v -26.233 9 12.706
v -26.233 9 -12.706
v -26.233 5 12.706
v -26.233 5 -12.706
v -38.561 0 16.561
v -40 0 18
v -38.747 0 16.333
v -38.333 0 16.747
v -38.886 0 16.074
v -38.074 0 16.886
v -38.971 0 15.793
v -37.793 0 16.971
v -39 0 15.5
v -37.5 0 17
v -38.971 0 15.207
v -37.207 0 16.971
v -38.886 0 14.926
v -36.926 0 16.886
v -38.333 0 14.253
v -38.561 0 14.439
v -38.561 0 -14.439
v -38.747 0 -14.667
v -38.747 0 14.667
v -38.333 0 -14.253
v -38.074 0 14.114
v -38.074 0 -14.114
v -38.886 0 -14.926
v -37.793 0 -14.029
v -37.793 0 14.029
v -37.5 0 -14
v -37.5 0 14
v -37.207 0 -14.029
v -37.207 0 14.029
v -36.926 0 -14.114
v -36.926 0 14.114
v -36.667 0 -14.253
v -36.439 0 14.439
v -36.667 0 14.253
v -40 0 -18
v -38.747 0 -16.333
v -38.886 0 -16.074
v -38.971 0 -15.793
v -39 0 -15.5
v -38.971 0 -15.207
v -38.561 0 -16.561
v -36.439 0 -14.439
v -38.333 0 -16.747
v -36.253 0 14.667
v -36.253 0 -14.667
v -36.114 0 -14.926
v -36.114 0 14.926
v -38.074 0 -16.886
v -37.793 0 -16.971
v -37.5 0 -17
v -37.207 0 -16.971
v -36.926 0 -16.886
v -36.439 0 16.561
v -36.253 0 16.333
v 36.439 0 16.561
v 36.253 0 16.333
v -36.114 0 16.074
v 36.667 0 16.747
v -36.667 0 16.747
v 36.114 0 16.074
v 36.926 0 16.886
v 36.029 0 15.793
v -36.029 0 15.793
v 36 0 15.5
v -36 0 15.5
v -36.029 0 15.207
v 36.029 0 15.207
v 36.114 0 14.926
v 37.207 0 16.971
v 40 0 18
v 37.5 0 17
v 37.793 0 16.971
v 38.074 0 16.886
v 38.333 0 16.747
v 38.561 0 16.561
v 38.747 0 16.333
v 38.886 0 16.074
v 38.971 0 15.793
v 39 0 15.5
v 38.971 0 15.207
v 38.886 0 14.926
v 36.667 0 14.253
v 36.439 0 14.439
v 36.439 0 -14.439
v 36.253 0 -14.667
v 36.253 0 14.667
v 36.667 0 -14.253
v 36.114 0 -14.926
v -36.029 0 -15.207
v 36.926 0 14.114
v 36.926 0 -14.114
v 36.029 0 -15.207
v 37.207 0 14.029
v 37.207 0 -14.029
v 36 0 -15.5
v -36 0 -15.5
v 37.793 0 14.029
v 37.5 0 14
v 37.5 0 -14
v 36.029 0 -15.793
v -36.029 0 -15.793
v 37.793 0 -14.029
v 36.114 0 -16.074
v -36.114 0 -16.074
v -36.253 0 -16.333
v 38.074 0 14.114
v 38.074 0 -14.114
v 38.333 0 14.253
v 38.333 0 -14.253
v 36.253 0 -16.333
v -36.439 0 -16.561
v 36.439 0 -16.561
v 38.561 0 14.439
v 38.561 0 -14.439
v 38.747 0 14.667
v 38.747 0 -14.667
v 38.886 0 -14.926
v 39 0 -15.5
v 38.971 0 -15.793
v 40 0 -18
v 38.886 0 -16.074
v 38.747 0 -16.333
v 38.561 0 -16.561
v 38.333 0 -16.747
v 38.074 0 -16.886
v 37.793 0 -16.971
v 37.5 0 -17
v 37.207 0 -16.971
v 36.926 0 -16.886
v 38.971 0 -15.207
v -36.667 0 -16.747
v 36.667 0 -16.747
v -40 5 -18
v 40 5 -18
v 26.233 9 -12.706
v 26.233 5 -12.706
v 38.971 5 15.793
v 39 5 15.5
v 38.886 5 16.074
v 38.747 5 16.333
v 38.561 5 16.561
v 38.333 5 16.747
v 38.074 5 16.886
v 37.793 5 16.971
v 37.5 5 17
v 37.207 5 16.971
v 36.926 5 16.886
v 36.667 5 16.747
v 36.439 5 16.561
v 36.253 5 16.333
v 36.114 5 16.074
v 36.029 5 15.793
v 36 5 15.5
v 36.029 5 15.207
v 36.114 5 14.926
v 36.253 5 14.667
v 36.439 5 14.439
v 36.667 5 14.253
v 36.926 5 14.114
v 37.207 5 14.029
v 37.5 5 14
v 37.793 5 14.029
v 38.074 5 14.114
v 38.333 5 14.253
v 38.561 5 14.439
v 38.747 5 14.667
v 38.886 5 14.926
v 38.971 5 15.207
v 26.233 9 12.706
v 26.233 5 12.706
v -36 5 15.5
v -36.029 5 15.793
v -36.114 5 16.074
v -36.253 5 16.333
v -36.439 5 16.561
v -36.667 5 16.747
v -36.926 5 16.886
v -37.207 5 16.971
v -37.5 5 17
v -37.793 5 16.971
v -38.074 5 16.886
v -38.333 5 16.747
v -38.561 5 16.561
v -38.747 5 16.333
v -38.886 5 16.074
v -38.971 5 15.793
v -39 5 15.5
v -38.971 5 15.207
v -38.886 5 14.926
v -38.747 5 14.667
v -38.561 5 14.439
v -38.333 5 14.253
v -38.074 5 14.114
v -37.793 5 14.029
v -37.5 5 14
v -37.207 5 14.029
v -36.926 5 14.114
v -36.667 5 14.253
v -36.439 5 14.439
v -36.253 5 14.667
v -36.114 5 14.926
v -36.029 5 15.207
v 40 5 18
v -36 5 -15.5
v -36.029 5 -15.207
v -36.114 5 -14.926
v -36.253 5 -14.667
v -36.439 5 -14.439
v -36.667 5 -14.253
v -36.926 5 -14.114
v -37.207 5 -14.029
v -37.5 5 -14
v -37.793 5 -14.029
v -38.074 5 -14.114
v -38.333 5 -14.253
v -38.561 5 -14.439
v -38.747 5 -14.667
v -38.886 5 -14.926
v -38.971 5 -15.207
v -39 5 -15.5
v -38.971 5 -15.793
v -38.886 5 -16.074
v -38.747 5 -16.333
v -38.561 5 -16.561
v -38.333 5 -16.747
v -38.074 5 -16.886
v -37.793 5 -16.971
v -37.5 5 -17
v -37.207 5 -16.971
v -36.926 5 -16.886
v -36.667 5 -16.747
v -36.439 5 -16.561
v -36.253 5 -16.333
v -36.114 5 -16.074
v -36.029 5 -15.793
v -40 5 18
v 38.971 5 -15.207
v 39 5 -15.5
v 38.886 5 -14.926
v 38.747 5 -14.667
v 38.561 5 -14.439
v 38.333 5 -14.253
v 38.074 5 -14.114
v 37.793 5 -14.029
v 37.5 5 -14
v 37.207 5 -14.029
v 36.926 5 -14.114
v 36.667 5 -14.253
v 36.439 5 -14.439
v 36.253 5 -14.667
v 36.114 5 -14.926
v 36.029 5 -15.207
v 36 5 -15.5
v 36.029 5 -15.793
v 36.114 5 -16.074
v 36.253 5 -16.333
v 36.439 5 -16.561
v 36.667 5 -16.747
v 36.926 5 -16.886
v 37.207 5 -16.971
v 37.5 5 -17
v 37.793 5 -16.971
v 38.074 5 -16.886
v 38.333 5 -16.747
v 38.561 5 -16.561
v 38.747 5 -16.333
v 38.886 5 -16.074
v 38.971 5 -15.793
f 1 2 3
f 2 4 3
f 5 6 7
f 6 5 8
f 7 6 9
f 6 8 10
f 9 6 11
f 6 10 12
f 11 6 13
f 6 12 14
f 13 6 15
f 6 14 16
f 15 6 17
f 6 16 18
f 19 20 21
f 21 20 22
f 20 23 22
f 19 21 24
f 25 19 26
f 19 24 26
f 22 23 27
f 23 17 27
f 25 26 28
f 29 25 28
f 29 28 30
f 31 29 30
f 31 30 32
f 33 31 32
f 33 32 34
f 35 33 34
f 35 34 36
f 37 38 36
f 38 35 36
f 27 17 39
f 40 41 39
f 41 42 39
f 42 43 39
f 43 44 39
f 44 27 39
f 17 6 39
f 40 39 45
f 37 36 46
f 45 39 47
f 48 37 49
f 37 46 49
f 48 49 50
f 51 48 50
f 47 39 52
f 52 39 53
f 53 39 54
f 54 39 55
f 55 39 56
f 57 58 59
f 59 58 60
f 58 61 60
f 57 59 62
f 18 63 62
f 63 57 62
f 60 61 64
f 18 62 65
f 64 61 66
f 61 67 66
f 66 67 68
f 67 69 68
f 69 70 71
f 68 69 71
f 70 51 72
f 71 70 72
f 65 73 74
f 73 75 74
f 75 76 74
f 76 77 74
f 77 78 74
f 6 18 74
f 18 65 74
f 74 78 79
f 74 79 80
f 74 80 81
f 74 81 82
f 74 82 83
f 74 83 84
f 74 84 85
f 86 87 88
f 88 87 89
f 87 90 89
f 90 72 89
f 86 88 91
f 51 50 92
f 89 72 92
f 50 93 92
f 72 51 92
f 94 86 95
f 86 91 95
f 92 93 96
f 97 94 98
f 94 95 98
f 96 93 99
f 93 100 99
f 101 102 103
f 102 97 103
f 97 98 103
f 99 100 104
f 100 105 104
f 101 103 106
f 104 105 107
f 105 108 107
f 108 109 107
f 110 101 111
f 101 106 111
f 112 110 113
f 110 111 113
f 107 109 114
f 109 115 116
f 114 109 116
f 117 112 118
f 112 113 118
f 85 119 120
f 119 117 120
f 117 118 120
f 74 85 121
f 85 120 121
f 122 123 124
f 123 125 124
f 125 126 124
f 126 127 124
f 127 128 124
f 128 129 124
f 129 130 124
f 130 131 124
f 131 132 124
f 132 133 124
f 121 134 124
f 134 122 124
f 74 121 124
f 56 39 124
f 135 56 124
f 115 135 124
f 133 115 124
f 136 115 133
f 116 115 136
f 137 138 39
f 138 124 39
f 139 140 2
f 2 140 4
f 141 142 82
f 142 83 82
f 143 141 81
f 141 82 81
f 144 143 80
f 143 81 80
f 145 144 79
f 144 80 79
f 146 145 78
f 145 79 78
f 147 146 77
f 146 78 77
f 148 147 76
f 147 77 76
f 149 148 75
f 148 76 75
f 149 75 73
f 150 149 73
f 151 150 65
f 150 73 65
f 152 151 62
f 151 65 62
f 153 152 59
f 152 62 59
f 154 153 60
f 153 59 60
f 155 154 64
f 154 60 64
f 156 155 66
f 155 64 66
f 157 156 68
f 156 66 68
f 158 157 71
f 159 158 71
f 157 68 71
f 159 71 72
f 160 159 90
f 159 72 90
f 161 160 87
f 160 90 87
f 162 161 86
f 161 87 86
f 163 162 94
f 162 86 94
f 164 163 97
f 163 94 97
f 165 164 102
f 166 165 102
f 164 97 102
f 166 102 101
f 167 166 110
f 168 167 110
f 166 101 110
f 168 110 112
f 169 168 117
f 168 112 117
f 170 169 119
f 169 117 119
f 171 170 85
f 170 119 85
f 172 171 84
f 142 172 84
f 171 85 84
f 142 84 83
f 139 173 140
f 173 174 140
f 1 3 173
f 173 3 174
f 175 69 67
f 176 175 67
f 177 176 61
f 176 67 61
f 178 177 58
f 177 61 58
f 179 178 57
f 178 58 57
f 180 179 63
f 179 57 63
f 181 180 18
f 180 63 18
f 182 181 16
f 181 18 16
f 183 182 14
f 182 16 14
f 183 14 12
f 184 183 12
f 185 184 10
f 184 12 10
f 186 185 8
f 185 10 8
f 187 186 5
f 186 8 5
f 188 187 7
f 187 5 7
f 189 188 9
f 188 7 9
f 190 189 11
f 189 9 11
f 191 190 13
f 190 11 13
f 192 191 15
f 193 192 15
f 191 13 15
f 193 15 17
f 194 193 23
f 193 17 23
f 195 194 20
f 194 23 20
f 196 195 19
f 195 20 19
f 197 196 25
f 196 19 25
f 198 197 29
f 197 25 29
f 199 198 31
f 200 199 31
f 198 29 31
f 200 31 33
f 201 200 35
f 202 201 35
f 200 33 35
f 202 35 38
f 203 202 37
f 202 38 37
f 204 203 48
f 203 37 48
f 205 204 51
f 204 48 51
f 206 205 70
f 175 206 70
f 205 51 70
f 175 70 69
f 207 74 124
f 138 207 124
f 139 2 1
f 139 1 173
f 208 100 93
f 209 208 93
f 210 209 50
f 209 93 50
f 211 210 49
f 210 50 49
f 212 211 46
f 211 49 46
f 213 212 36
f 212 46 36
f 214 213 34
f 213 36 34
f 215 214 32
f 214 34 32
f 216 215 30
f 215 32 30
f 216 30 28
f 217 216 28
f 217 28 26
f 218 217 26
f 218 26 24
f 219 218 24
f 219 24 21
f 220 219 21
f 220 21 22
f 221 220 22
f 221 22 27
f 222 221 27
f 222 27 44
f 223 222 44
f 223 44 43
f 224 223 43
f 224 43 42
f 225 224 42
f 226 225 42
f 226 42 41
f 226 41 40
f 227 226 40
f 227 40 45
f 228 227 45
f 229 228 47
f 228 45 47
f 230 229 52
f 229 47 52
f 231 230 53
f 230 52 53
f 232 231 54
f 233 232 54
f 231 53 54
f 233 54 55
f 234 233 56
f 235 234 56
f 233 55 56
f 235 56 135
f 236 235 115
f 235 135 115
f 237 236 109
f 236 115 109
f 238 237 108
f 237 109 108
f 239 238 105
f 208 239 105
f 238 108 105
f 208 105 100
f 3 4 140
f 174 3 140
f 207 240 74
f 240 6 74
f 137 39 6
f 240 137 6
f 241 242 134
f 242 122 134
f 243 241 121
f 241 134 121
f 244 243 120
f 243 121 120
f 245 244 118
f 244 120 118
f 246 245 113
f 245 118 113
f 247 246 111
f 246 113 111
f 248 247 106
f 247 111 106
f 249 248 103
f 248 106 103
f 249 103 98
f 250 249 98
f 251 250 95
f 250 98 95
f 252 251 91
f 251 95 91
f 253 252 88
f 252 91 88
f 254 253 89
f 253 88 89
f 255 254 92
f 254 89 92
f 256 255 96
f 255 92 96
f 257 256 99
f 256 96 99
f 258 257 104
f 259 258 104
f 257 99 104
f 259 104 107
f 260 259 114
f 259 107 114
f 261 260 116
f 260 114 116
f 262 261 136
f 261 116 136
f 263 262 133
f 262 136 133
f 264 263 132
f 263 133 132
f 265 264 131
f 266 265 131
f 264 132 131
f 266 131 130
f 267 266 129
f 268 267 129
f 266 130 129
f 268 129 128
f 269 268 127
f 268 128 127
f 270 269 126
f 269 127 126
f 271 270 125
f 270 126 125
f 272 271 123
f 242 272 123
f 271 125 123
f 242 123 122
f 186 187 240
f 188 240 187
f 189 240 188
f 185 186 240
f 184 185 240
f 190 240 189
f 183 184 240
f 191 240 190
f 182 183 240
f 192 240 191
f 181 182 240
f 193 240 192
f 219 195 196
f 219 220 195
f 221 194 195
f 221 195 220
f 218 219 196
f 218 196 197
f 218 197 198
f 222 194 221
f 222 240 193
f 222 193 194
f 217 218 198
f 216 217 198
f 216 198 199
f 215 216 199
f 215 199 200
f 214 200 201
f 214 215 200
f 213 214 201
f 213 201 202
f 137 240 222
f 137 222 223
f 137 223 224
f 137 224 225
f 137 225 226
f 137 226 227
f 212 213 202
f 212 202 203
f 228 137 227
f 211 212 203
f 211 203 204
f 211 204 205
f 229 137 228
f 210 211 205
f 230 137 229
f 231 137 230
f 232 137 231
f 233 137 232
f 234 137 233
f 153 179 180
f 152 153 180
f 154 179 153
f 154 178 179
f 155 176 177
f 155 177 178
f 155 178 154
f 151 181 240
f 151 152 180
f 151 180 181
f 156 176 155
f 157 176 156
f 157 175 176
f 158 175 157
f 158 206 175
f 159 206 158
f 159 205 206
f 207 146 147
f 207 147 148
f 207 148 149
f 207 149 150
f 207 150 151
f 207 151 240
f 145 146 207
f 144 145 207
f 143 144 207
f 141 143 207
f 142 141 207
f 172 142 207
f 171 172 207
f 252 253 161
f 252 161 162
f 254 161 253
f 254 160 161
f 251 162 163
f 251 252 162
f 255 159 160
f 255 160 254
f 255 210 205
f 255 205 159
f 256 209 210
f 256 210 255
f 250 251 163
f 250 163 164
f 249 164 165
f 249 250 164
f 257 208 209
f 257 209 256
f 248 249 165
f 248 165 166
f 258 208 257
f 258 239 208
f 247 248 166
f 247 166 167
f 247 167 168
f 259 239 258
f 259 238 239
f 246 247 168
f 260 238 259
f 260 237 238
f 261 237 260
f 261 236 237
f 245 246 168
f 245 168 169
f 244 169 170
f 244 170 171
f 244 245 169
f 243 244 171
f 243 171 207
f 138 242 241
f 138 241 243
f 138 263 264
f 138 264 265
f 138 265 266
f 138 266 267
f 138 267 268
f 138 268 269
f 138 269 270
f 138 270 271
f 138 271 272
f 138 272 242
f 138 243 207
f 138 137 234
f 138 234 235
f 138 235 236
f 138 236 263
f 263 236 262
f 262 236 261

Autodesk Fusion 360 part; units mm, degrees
sketch "Boceto2" plane through (0, 0, 0) normal (0, 1, 0) x (1, 0, 0)
  line L0 (40, 18) -> (-40, 18)
  line L1 (-40, 18) -> (-40, -18)
  line L2 (-40, -18) -> (40, -18)
  line L3 (40, -18) -> (40, 18)
  line L4 (40, 18) -> (-40, -18) construction
  line L5 (-40, 18) -> (40, -18) construction
  line L6 (37.5, 15.5) -> (-37.5, 15.5)
  line L7 (-37.5, 15.5) -> (-37.5, -15.5)
  line L8 (-37.5, -15.5) -> (37.5, -15.5)
  line L9 (37.5, -15.5) -> (37.5, 15.5)
  line L10 (37.5, 15.5) -> (-37.5, -15.5) construction
  line L11 (-37.5, 15.5) -> (37.5, -15.5) construction
  circle A0 centre (37.5, -15.5) radius 1.5
  circle A1 centre (-37.5, 15.5) radius 1.5
  circle A2 centre (-37.5, -15.5) radius 1.5
  circle A3 centre (37.5, 15.5) radius 1.5
  line L12 (26.2327, 12.7061) -> (-26.2327, 12.7061)
  line L13 (-26.2327, 12.7061) -> (-26.2327, -12.7061)
  line L14 (-26.2327, -12.7061) -> (26.2327, -12.7061)
  line L15 (26.2327, -12.7061) -> (26.2327, 12.7061)
  line L16 (26.2327, 12.7061) -> (-26.2327, -12.7061) construction
  line L17 (-26.2327, 12.7061) -> (26.2327, -12.7061) construction
  dimension "d5" = 75
  dimension "d6" = 31
  dimension "d7" = 80
  dimension "d8" = 36
  dimension "d9" = 3
extrude "Extruir1" add sketch "Boceto2" along normal blind 5 contours L0 L1 L2 L3 | L6 L7 L8 L9 A0 A1 A2 A3 | L12 L13 L14 L15 makes body 1
extrude "Extruir2" add sketch "Boceto2" along normal blind 4 from surface at 5 separate body contours L12 L13 L14 L15 makes body 2
